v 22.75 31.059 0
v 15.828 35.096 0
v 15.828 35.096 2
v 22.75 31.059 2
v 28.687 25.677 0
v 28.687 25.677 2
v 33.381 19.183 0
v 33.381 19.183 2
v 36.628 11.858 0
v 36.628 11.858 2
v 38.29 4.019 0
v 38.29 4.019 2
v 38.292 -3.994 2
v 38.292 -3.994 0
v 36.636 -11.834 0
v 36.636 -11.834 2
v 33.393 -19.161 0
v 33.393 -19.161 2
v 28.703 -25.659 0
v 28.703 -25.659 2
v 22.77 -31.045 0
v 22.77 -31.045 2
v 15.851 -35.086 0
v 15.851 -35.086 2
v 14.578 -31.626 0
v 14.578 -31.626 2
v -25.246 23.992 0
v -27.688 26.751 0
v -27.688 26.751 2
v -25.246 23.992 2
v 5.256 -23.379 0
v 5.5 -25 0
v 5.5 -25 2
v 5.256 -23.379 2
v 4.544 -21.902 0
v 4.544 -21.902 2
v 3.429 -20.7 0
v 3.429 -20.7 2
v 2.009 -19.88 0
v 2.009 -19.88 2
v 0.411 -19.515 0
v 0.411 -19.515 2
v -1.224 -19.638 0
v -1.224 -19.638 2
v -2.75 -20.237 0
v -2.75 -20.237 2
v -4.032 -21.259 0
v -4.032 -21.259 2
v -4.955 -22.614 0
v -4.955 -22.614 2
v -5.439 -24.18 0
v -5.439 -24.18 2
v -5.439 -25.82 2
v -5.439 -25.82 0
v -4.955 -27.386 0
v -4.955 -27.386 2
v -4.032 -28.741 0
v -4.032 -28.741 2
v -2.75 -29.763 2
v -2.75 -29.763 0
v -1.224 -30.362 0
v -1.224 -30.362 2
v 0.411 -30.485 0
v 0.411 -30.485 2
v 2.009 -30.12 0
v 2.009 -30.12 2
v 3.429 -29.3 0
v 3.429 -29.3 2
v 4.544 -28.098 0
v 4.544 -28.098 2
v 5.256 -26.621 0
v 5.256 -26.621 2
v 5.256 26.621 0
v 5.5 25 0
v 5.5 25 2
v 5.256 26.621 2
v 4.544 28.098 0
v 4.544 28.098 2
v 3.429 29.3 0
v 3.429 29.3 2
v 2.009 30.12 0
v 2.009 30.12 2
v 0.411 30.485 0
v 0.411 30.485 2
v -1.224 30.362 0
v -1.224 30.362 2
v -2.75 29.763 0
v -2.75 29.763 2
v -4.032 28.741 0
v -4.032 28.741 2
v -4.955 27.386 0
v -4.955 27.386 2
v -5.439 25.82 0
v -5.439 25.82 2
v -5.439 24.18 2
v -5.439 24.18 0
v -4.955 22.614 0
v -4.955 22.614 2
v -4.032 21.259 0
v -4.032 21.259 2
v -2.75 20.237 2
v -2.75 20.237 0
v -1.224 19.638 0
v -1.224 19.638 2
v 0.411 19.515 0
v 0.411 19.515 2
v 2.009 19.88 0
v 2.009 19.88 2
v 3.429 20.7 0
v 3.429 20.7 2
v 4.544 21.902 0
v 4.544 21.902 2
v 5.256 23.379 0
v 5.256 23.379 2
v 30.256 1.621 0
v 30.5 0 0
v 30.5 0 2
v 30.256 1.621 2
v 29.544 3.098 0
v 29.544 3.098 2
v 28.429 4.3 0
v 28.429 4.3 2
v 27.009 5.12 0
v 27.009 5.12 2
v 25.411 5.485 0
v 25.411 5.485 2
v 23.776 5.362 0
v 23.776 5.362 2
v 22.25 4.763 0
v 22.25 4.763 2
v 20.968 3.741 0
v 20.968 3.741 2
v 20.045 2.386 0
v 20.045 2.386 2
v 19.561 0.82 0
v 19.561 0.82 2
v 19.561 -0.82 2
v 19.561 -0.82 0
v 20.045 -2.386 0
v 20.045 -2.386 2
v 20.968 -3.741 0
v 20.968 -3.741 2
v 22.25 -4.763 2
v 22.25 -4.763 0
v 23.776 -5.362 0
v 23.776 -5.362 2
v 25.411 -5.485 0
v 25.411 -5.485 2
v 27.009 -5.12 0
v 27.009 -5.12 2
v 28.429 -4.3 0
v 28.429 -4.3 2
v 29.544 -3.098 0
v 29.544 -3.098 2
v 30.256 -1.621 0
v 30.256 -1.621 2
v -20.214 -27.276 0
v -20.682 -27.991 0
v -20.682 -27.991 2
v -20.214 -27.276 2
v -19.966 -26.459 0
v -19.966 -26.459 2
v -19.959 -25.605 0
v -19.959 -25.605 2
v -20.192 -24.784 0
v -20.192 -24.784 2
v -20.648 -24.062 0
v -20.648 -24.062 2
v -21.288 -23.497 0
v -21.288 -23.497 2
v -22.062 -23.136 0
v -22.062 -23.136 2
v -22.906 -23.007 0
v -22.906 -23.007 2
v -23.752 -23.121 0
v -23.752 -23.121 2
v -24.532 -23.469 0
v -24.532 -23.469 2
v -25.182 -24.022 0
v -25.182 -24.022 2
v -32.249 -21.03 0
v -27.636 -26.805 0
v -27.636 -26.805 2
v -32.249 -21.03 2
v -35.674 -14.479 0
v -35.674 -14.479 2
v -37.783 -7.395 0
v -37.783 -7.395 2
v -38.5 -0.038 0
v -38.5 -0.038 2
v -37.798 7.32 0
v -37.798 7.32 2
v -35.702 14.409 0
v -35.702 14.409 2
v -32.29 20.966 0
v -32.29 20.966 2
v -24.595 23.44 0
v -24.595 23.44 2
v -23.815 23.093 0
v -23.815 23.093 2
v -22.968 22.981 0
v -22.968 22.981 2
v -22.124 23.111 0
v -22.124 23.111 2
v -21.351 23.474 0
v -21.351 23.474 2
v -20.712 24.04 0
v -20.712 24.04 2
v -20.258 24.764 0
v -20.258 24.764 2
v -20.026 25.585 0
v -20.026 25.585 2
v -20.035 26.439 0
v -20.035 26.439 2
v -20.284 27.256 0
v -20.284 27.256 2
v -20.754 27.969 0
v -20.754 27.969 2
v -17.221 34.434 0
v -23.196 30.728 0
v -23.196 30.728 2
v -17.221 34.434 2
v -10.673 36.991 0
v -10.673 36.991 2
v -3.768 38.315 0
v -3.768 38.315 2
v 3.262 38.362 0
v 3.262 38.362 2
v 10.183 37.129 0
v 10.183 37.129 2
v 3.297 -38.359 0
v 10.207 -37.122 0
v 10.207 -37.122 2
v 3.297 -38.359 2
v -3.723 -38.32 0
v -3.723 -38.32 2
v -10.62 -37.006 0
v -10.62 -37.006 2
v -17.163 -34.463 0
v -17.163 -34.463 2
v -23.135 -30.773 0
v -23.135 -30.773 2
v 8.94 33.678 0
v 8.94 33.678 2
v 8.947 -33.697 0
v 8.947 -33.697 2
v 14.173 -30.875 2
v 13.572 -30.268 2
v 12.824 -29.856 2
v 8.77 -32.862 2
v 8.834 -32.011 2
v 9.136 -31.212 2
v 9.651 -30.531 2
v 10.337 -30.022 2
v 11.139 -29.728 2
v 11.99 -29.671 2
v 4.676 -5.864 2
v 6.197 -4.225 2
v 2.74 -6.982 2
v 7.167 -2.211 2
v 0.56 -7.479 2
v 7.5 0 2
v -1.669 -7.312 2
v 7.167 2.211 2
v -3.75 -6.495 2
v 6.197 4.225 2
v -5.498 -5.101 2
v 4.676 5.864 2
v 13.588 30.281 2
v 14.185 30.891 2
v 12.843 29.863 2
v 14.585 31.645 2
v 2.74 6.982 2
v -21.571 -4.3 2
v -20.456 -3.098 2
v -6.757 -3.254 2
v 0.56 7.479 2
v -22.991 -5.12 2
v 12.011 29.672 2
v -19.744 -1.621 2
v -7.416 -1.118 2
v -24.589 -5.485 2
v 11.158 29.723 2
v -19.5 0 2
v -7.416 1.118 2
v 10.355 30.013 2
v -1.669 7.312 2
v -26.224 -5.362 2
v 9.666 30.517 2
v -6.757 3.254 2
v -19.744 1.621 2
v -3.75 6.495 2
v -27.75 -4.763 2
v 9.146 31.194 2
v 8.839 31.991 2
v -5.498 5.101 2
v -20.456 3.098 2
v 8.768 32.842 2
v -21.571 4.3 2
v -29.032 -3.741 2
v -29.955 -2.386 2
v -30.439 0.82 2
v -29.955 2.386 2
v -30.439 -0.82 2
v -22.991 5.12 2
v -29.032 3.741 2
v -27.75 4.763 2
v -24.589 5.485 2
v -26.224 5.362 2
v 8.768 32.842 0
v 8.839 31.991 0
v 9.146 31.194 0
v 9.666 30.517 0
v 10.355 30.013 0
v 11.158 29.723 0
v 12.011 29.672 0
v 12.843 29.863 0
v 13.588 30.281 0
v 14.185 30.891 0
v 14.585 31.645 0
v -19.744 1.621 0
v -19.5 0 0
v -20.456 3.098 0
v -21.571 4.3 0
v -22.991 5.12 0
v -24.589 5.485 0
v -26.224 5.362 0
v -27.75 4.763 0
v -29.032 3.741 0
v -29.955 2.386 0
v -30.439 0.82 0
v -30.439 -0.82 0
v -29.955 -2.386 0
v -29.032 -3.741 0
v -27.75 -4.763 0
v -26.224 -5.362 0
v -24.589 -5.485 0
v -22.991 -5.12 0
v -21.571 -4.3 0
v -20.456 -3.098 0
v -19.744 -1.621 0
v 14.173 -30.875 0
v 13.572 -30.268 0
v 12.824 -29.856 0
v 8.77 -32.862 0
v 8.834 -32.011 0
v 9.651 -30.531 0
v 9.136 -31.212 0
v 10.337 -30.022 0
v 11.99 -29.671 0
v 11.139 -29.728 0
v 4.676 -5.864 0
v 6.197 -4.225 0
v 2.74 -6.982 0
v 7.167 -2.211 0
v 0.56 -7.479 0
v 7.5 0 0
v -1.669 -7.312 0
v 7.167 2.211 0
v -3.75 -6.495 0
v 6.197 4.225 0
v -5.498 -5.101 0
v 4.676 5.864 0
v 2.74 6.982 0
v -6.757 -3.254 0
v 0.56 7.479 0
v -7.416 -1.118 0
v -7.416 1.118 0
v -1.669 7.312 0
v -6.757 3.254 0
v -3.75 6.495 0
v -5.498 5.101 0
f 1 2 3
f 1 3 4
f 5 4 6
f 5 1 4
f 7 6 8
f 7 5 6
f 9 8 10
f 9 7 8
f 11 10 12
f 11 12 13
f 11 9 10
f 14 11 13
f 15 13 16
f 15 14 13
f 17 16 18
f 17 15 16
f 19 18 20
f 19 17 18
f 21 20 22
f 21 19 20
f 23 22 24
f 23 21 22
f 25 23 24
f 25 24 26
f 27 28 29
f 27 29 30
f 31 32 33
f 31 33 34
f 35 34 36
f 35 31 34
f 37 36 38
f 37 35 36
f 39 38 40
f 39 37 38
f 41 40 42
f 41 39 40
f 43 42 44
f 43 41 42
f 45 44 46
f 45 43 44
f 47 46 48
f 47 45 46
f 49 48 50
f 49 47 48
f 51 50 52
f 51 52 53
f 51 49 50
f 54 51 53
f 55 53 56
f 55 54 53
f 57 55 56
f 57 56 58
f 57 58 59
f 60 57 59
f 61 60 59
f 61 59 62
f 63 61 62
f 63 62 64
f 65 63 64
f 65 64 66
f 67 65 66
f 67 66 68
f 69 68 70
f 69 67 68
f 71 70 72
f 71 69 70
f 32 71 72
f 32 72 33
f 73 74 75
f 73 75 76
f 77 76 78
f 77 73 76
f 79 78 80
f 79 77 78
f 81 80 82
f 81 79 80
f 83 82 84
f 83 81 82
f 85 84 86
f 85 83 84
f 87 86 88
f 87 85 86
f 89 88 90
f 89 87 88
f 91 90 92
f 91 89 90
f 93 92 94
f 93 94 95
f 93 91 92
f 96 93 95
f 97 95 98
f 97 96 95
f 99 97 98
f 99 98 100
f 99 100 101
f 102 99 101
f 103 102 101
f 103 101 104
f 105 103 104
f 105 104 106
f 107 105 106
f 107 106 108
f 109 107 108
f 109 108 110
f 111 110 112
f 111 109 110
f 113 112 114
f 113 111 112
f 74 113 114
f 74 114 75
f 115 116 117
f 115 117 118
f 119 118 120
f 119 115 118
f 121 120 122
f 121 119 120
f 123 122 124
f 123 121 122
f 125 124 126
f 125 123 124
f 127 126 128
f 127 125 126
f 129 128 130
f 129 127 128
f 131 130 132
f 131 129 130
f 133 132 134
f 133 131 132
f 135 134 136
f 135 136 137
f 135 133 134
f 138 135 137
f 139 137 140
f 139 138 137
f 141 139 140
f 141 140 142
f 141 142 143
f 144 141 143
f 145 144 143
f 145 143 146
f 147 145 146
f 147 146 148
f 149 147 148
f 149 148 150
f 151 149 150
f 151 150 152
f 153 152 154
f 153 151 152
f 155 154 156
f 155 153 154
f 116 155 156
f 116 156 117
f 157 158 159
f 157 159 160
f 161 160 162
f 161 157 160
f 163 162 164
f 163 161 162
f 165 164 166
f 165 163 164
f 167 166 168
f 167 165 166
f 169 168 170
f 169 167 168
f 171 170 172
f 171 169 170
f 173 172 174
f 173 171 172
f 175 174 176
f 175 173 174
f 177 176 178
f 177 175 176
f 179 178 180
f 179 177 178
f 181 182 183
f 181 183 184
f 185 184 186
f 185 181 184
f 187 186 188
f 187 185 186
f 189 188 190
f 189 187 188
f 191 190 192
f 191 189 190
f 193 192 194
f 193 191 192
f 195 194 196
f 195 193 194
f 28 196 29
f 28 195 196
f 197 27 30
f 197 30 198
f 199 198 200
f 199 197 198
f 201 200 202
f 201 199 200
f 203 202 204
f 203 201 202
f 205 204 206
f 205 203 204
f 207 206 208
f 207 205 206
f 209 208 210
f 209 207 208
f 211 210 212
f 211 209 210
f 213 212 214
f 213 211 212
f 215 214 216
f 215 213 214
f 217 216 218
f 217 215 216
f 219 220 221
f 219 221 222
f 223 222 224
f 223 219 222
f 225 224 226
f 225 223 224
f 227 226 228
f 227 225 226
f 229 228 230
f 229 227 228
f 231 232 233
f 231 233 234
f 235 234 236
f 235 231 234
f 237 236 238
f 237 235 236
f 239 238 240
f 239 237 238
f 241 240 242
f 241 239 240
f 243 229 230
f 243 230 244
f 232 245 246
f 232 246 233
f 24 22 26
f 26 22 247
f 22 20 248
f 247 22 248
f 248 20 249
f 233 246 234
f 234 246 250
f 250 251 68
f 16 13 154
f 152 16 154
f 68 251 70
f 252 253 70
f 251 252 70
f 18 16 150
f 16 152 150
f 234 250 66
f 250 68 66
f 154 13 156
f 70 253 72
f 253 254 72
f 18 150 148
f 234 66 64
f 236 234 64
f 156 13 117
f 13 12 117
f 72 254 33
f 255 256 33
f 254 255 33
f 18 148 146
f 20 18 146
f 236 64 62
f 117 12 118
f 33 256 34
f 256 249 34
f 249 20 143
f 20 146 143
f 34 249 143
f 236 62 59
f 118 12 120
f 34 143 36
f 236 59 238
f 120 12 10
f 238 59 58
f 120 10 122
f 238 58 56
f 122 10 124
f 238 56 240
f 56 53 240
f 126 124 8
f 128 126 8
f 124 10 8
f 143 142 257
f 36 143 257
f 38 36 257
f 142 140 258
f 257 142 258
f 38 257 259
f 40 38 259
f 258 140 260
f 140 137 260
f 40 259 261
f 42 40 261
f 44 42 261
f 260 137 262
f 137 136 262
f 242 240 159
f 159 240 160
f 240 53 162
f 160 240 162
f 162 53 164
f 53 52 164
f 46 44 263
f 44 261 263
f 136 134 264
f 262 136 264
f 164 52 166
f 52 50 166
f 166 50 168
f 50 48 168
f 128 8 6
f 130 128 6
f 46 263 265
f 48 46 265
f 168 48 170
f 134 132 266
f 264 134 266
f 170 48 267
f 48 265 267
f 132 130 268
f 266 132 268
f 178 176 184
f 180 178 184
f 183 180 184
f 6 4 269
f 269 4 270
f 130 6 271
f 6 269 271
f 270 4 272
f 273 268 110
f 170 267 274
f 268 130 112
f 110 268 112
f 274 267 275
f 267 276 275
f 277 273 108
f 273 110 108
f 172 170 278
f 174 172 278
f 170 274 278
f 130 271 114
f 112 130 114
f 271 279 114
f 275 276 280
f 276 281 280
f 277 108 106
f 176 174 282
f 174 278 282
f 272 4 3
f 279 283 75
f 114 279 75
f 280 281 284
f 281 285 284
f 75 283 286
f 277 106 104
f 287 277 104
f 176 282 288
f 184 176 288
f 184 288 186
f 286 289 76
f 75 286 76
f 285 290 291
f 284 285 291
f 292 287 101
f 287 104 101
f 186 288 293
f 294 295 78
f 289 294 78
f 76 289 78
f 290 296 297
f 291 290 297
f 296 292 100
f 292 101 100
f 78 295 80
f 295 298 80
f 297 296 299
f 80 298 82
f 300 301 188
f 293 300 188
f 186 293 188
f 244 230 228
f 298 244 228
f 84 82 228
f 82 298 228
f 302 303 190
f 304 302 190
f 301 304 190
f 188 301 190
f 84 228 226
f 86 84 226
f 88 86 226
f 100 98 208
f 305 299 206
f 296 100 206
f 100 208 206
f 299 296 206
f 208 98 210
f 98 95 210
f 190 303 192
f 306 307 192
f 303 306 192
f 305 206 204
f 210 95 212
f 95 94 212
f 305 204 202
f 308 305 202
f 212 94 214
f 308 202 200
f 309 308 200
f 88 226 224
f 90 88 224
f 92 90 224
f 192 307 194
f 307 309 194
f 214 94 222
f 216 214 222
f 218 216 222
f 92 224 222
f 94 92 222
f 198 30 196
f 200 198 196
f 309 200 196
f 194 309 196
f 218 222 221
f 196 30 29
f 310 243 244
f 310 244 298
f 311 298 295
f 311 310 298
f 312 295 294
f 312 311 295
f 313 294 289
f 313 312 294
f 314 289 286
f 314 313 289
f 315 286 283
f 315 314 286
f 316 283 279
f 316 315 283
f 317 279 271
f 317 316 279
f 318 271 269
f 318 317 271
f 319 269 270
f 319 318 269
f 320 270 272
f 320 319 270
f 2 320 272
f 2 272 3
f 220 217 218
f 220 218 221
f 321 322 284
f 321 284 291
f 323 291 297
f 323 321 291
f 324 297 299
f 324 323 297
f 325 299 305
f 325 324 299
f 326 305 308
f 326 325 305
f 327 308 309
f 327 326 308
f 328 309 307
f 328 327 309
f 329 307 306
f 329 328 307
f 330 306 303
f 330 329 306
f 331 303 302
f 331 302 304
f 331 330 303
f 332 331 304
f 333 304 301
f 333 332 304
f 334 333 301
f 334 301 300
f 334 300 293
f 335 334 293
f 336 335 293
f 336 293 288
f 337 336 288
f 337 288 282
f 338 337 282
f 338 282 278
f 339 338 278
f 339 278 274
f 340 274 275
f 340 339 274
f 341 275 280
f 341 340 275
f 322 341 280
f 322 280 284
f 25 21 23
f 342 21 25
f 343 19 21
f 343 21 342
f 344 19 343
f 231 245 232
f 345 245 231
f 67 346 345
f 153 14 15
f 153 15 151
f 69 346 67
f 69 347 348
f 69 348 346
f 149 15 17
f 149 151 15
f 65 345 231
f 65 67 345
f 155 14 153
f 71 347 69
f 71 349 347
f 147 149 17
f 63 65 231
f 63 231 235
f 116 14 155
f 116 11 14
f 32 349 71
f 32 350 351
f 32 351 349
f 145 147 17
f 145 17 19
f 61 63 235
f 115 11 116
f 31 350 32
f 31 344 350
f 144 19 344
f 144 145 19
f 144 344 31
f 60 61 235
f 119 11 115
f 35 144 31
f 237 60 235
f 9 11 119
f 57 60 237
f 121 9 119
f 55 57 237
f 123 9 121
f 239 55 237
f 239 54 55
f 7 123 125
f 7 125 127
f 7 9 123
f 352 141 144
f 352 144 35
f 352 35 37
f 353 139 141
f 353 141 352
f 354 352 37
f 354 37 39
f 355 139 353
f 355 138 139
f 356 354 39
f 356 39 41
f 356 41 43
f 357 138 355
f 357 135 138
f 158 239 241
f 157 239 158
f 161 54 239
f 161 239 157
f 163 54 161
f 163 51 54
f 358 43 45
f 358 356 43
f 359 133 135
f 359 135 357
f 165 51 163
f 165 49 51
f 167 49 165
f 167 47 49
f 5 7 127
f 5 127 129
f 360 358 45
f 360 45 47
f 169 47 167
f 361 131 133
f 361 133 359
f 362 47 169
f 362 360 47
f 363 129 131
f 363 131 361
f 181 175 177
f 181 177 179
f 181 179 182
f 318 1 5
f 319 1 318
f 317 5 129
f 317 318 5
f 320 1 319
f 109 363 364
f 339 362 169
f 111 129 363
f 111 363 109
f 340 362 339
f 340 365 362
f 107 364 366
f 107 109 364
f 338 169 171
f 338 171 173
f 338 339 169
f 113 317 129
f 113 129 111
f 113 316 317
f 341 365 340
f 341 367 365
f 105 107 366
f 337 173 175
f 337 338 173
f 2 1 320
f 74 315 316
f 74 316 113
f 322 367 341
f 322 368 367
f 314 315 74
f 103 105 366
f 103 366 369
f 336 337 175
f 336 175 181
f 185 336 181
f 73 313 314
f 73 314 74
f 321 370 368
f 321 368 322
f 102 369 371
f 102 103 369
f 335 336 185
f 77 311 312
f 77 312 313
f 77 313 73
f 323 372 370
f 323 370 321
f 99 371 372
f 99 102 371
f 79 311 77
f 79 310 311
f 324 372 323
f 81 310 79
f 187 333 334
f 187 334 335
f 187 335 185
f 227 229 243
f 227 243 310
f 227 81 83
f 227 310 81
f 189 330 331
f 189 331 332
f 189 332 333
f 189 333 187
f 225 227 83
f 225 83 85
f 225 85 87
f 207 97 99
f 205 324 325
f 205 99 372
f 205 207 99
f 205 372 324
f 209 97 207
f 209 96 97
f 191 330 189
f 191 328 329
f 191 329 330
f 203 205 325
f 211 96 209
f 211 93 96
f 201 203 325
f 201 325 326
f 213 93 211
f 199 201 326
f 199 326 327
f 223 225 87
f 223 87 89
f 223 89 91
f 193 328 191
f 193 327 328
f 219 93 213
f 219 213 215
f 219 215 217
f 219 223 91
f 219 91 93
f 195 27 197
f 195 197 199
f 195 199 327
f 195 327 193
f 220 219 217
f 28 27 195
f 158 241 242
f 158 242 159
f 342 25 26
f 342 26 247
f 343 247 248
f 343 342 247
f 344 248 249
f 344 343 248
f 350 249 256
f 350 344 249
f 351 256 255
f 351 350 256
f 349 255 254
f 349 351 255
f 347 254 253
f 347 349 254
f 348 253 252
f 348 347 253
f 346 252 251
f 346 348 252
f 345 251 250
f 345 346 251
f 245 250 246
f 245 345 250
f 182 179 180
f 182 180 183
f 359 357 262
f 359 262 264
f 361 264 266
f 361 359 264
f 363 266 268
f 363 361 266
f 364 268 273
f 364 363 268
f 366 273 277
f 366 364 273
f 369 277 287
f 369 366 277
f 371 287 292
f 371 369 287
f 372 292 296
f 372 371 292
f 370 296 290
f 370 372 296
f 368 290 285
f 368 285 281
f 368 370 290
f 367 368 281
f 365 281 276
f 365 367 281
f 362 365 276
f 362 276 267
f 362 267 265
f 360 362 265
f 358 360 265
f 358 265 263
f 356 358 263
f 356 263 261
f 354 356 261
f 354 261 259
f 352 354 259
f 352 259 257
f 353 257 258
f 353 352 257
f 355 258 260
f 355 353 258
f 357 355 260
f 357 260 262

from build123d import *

# Parameters (mm, degrees)
MODEL_R             = 5.5
MODEL_R_2           = 7.5
BOSS_EXTRUDE1_DEPTH = 2


with BuildPart() as part:
    # Model → Boss-Extrude1 (new body)
    with BuildSketch(Plane.XY):
        with BuildLine():
            Line((8.947329511, -33.697448784), (10.207027791, -37.122319212))
            ThreePointArc((10.207027791, -37.122319212), (-7.201532375, -37.820469741), (-23.135313057, -30.773483549))
            Line((-23.135313057, -30.773483549), (-20.68154198, -27.990692072))
            ThreePointArc((-20.68154198, -27.990692072), (-20.947588277, -23.756401179), (-25.18187917, -24.022447477))
            Line((-25.18187917, -24.022447477), (-27.635650248, -26.805238954))
            ThreePointArc((-27.635650248, -26.805238954), (-38.49998136, -0.037885337), (-27.688351274, 26.750798188))
            Line((-27.688351274, 26.750798188), (-25.246259349, 23.992215172))
            ThreePointArc((-25.246259349, 23.992215172), (-21.011453059, 23.734502765), (-20.753740651, 27.969309055))
            Line((-20.753740651, 27.969309055), (-23.195832576, 30.727892071))
            ThreePointArc((-23.195832576, 30.727892071), (-7.250949904, 37.811026507), (10.183062279, 37.128900369))
            Line((10.183062279, 37.128900369), (8.940382065, 33.678361242))
            ThreePointArc((8.940382065, 33.678361242), (10.746378971, 29.839375176), (14.585365036, 31.645372081))
            Line((14.585365036, 31.645372081), (15.82804525, 35.095911209))
            ThreePointArc((15.82804525, 35.095911209), (38.499997976, 0.012482786), (15.85080009, -35.085640033))
            Line((15.85080009, -35.085640033), (14.578417591, -31.626283722))
            ThreePointArc((14.578417591, -31.626283722), (10.72729102, -29.846322213), (8.947329511, -33.697448784))
        make_face()
        with Locations((-25, 0)):
            Circle(MODEL_R, mode=Mode.SUBTRACT)
        with Locations((0, 25)):
            Circle(MODEL_R, mode=Mode.SUBTRACT)
        with Locations((0, -25)):
            Circle(MODEL_R, mode=Mode.SUBTRACT)
        with Locations((25, 0)):
            Circle(MODEL_R, mode=Mode.SUBTRACT)
        Circle(MODEL_R_2, mode=Mode.SUBTRACT)
    extrude(amount=BOSS_EXTRUDE1_DEPTH)


solid = part.part
